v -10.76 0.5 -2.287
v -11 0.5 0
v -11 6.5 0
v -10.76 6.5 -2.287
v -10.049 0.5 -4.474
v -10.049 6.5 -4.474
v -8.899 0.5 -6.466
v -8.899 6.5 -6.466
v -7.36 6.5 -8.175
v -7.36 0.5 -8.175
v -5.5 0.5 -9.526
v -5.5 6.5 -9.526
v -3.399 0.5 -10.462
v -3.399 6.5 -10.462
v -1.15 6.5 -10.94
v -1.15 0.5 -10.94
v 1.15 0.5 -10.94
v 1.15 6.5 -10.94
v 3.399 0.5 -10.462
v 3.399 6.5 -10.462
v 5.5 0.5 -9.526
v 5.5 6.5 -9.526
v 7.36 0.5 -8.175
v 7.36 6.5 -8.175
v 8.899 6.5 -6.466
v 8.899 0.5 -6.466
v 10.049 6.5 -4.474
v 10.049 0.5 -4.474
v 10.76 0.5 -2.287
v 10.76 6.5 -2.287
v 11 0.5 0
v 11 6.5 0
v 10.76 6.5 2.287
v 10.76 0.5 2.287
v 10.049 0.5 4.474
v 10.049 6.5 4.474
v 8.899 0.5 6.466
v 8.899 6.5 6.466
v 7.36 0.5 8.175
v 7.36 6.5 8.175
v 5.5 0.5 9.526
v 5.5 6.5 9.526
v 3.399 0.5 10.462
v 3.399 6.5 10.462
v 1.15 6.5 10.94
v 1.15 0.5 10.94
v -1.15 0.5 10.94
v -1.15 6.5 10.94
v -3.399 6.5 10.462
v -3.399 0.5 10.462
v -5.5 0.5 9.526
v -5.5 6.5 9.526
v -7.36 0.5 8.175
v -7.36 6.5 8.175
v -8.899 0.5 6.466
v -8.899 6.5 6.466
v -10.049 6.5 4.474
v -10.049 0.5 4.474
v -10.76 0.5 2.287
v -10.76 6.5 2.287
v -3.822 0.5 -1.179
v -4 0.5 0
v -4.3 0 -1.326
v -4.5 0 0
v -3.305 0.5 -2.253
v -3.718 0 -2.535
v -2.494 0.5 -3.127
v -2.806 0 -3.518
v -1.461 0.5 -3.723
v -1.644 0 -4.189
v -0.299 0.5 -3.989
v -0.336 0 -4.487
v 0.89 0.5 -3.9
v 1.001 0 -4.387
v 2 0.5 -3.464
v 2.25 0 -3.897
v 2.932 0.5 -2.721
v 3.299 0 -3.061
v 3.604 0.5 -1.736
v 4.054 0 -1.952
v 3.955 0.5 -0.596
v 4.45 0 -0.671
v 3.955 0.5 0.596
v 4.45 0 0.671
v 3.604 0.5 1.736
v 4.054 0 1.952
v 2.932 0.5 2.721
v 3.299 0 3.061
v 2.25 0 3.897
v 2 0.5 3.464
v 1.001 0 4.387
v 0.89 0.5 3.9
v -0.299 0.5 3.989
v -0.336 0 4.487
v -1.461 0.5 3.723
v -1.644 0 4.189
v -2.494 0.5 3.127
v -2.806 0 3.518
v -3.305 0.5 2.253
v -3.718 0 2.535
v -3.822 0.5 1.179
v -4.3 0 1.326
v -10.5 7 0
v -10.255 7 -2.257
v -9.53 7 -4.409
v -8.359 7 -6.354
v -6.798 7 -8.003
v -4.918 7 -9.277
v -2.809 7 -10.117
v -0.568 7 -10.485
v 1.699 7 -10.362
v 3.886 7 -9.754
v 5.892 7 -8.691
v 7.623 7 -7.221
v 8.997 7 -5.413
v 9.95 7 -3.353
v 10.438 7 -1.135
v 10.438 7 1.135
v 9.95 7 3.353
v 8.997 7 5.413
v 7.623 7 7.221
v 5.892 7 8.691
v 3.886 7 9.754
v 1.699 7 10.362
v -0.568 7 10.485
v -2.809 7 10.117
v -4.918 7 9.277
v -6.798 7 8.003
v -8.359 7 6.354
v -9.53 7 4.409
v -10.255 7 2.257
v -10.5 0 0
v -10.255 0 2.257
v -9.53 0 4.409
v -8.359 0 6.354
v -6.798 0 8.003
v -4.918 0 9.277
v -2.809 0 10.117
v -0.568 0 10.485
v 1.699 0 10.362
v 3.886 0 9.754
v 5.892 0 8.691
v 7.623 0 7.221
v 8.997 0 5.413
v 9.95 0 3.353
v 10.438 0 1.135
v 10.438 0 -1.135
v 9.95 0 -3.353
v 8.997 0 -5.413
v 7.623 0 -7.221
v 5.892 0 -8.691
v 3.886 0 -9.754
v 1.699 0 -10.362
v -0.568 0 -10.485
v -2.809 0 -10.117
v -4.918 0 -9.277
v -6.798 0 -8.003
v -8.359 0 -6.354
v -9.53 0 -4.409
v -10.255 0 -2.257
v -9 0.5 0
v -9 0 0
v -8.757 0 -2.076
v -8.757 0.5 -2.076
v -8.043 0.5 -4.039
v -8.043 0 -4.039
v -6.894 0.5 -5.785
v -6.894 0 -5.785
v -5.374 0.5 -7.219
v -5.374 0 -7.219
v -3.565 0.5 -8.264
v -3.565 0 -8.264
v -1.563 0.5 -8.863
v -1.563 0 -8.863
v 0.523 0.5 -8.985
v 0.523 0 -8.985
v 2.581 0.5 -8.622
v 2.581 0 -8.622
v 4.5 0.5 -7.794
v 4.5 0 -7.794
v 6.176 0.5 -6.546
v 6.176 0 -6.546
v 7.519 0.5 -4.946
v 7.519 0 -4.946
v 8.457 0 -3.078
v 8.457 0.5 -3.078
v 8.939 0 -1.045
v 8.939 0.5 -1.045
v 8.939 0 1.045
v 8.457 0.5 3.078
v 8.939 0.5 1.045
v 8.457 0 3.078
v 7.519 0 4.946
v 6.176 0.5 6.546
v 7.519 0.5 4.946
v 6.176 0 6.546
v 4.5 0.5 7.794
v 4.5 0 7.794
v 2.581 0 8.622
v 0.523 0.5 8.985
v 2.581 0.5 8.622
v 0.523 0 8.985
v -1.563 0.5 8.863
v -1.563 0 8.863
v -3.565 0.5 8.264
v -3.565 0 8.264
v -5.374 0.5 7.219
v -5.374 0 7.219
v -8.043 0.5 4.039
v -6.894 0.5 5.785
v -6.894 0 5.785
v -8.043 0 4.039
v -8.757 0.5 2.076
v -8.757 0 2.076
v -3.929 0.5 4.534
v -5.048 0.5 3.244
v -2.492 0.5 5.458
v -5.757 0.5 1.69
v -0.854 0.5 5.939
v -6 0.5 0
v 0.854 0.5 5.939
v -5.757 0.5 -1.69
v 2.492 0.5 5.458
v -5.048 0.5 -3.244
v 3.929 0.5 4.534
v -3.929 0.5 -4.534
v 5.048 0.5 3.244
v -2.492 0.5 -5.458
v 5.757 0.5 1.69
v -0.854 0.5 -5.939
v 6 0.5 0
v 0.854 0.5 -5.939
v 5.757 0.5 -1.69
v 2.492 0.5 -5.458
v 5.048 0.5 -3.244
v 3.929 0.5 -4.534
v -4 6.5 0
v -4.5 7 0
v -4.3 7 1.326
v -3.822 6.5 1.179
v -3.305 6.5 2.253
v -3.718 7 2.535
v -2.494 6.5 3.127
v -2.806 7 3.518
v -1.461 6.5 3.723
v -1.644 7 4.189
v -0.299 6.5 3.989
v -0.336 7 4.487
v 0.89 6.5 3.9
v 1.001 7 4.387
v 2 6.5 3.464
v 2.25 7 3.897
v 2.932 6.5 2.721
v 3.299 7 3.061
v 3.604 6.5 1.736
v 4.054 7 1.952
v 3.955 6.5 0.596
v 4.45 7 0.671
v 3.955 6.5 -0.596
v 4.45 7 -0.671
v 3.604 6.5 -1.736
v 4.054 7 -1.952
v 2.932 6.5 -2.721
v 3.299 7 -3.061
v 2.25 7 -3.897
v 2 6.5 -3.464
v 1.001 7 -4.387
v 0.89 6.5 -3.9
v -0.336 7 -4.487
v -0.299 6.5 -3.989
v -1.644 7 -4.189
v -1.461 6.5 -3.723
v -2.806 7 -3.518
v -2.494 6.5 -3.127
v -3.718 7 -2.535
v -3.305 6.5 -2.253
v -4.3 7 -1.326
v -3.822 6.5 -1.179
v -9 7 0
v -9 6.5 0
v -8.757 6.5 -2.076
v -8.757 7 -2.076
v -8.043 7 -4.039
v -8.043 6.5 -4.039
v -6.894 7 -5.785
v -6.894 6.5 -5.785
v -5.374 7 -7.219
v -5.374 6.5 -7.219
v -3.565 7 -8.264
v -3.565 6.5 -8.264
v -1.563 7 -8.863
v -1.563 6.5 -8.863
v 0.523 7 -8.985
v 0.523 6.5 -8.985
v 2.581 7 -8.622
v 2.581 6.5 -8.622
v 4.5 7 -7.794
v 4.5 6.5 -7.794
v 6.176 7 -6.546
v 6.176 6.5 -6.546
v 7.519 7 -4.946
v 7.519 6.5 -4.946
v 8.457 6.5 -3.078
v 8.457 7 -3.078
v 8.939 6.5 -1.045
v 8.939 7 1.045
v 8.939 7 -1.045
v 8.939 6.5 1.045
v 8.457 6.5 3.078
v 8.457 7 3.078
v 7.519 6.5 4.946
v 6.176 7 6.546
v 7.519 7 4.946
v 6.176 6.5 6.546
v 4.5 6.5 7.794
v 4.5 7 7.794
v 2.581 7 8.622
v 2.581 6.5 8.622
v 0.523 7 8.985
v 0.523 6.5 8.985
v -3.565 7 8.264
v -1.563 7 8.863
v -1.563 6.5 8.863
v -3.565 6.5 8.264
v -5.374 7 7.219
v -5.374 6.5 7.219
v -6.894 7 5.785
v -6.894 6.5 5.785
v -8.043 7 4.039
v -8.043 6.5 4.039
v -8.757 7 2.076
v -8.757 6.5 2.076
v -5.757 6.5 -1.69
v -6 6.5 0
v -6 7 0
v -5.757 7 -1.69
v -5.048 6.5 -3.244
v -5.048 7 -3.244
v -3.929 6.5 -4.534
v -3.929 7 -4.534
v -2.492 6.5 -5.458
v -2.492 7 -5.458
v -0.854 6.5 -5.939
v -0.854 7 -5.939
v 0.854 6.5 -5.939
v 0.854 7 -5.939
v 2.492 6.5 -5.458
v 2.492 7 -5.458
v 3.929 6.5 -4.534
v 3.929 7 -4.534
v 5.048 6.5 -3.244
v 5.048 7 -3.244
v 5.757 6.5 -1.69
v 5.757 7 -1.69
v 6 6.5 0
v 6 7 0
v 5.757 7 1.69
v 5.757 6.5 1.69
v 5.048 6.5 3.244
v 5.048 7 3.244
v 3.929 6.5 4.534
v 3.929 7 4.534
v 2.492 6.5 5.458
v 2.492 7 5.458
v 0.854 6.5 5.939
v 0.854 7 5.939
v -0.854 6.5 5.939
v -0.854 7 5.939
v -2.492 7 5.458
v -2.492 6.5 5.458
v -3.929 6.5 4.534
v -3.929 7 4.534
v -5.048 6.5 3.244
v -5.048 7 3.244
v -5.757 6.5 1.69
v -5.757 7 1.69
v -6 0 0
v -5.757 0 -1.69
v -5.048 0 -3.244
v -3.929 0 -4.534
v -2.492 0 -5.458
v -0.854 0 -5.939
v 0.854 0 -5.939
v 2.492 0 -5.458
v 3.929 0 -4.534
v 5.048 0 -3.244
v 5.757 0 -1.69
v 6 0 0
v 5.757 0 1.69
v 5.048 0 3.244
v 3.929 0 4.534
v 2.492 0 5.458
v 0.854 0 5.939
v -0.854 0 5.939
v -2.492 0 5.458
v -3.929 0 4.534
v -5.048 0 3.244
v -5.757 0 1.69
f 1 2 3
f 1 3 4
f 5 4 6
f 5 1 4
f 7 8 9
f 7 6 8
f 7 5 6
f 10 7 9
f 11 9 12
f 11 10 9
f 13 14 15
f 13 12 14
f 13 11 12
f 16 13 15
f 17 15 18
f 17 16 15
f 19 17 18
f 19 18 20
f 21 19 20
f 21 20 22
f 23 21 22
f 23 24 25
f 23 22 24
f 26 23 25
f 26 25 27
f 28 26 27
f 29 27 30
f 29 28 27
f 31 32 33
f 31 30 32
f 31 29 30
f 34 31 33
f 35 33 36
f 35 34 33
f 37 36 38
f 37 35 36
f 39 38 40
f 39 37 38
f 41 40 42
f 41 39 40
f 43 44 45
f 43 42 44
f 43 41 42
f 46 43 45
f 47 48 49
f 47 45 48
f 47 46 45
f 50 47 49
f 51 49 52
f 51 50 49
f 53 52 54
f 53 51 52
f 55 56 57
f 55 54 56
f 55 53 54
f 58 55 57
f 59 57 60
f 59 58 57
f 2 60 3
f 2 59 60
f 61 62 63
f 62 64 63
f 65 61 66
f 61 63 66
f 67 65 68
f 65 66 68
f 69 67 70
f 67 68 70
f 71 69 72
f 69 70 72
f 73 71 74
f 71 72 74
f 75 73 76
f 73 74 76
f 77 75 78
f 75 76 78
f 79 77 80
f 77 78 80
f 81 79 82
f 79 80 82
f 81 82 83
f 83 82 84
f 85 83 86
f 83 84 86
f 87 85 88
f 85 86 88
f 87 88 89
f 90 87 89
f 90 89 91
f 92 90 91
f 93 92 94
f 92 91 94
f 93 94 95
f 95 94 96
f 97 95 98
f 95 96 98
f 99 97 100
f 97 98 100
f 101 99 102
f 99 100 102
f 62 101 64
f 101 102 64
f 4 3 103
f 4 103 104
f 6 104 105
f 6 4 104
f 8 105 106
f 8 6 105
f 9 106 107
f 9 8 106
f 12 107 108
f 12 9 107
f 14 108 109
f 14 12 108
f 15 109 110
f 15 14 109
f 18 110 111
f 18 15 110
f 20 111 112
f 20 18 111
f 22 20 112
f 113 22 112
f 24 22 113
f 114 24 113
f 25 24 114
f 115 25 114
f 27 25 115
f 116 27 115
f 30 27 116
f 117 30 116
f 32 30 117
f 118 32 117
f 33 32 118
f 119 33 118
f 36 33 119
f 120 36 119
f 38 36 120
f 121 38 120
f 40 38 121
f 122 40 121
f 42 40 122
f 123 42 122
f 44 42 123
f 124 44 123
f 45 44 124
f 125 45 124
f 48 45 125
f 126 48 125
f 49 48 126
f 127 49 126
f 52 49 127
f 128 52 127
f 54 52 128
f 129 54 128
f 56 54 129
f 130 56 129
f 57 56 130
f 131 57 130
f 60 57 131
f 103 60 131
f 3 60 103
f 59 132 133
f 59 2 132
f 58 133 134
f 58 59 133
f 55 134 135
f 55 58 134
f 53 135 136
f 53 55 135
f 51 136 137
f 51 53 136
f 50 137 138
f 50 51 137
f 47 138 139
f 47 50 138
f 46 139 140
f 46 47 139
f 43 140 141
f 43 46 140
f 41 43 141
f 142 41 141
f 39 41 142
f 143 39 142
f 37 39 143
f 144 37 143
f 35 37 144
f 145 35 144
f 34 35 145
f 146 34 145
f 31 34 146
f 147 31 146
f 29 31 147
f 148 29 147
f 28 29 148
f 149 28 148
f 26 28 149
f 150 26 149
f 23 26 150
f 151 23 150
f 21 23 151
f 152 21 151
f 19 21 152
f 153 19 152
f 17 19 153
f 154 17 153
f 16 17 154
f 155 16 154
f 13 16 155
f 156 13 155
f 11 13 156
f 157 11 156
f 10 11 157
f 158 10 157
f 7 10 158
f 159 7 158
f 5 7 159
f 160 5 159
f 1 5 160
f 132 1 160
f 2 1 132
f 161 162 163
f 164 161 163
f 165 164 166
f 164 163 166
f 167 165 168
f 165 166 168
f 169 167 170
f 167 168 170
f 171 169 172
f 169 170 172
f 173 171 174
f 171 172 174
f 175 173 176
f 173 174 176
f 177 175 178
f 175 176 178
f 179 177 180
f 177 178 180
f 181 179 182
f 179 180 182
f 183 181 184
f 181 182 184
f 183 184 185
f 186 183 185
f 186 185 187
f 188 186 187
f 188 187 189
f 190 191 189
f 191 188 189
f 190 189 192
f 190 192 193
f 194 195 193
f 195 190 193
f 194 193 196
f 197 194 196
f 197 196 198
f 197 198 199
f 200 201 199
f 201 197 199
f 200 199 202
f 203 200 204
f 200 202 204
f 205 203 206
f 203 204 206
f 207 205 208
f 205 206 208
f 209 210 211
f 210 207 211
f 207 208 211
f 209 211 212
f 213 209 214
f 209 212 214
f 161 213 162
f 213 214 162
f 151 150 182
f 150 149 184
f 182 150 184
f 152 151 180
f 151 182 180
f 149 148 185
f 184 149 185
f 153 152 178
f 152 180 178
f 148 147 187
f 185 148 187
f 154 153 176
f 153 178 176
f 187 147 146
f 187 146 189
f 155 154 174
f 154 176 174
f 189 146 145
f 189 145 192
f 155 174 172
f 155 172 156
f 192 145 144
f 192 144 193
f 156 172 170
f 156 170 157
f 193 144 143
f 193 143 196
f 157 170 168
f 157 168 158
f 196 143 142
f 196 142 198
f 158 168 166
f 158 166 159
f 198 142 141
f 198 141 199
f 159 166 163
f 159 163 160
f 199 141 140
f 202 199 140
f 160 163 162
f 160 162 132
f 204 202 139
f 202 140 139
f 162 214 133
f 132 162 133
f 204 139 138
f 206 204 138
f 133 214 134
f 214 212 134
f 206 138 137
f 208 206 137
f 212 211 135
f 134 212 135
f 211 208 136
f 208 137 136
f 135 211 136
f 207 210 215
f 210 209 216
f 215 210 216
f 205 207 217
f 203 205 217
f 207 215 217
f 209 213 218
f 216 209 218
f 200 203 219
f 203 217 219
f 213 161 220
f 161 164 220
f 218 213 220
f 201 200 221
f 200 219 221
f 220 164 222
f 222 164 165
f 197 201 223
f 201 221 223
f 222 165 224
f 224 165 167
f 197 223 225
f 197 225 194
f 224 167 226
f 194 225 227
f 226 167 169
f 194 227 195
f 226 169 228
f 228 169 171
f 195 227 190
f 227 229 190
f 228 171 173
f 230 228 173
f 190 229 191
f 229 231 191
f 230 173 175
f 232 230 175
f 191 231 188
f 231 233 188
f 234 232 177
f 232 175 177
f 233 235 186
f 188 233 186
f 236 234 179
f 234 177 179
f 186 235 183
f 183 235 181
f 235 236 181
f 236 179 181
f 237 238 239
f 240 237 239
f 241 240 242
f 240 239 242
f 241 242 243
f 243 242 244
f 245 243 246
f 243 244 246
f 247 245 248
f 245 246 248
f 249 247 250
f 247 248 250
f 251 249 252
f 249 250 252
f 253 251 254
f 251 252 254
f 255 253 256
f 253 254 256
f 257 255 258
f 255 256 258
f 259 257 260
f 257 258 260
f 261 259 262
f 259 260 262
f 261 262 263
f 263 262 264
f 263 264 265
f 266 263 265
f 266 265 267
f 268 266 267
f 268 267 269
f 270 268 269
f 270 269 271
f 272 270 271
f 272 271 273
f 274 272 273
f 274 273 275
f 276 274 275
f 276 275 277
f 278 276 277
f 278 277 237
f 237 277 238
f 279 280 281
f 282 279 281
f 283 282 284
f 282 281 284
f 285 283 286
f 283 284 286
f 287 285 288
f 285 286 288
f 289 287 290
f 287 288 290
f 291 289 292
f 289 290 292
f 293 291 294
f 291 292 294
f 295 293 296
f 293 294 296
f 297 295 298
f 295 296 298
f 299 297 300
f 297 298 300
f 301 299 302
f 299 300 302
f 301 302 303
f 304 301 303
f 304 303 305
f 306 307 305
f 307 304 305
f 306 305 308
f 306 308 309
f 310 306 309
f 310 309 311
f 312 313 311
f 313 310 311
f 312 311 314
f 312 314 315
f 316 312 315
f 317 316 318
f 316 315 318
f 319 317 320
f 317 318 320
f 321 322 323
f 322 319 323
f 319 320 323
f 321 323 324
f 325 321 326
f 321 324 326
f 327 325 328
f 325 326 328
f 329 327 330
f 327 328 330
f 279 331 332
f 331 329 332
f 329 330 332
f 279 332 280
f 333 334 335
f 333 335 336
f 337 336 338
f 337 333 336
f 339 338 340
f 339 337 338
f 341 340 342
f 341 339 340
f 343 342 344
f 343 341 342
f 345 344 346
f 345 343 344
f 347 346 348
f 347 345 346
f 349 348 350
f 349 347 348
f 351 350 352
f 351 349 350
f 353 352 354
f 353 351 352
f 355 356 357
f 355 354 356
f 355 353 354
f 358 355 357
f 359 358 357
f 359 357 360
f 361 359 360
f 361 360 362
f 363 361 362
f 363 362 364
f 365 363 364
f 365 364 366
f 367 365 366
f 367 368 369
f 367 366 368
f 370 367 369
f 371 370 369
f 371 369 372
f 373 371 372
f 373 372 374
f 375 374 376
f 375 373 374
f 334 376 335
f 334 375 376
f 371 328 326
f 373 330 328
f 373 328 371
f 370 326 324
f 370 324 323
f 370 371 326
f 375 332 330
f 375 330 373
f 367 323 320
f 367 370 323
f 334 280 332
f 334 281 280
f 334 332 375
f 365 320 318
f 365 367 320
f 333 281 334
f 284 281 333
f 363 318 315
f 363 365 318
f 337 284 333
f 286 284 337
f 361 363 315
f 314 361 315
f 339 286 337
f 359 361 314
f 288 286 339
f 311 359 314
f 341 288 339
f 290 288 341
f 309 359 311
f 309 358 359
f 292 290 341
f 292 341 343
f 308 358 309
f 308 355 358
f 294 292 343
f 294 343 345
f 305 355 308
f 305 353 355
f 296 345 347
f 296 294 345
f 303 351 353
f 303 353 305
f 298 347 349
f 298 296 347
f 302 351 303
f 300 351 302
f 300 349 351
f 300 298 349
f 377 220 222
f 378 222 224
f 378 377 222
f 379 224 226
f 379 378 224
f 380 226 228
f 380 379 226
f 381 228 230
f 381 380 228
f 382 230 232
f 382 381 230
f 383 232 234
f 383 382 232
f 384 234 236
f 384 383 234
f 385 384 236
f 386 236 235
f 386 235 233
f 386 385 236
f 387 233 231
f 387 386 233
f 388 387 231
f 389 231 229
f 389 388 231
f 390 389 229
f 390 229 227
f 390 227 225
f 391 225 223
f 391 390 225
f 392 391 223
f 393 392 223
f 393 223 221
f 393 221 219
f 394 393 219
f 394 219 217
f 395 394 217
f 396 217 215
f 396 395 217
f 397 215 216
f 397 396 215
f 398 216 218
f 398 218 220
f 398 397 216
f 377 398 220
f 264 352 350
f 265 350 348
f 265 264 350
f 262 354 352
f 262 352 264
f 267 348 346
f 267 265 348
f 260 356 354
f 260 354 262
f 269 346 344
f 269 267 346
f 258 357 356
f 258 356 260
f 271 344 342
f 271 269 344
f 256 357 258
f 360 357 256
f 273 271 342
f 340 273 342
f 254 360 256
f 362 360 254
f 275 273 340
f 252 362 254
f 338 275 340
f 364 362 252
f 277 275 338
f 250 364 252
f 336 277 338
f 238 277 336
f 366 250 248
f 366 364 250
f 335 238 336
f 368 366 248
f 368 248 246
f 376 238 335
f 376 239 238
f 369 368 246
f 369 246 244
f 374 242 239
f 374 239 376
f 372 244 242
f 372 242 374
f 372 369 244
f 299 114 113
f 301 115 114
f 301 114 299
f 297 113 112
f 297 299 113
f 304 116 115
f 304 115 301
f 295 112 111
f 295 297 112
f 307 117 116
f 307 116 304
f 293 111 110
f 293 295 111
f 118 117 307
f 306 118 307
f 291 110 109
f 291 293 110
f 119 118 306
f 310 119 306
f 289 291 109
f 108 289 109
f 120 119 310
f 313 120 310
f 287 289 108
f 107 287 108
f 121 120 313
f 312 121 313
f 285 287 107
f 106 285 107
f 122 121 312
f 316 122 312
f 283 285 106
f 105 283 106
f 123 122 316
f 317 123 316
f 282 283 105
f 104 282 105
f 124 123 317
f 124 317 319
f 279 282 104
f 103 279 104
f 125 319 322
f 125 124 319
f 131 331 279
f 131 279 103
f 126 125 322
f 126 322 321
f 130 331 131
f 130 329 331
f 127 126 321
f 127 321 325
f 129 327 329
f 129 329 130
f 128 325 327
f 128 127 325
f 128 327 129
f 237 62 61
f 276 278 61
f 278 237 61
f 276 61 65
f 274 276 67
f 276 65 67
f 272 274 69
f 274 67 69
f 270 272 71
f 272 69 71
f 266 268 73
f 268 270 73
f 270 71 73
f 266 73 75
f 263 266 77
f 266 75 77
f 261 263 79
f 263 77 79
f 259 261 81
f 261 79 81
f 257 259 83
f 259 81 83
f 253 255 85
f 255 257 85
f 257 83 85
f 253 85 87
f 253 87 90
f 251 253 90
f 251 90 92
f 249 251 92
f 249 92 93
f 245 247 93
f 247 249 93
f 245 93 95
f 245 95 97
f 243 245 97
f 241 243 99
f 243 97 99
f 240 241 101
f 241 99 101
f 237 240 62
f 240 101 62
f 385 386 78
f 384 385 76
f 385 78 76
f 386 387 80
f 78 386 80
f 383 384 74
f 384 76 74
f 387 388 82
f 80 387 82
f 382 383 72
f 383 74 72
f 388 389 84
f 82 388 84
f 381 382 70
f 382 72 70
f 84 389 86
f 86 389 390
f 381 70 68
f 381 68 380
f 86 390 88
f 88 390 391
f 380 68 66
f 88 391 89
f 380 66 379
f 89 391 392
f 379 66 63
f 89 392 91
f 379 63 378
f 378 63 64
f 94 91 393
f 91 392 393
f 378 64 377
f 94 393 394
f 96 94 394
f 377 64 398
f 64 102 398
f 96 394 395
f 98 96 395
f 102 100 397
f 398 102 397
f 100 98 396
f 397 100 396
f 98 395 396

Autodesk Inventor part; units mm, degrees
ref_plane "YZ Plane" through (0, 0, 0) normal (1, 0, 0) x (0, 1, 0)
ref_plane "XZ Plane" through (0, 0, 0) normal (0, 1, 0) x (-1, 0, 0)
sketch "Sketch1" plane through (0, 0, 0) normal (0, 1, 0) x (-1, 0, 0)
  circle A0 centre (0, 0) radius 11
  circle A1 centre (0, 0) radius 4
  circle A2 centre (0, 0) radius 6
  circle A3 centre (0, 0) radius 9
  dimension "d0" = 22
  dimension "d1" = 8
  dimension "d2" = 2
  dimension "d3" = 2
extrude "Extrusion1" add sketch "Sketch1" along normal blind 7
ref_plane "Work Plane1" through (0, 6.5, 0) normal (0, 1, 0) x (1, 0, 0)
sketch "Sketch2" plane through (0, 6.5, 0) normal (0, 1, 0) x (1, 0, 0)
  circle A0 centre (0, 0) radius 6
  circle A1 centre (0, 0) radius 9
  circle A2 centre (0, 0) radius 6 projected
  circle A3 centre (0, 0) radius 9 projected
extrude "Extrusion2" add sketch "Sketch2" against normal blind 6
chamfer "Chamfer1" distance 0.5 angle 45 4 edges at (11, 7, 0) (11, 0, 0) (4, 7, 0) (4, 0, 0)
properties part number "Cojinete_608zz"
